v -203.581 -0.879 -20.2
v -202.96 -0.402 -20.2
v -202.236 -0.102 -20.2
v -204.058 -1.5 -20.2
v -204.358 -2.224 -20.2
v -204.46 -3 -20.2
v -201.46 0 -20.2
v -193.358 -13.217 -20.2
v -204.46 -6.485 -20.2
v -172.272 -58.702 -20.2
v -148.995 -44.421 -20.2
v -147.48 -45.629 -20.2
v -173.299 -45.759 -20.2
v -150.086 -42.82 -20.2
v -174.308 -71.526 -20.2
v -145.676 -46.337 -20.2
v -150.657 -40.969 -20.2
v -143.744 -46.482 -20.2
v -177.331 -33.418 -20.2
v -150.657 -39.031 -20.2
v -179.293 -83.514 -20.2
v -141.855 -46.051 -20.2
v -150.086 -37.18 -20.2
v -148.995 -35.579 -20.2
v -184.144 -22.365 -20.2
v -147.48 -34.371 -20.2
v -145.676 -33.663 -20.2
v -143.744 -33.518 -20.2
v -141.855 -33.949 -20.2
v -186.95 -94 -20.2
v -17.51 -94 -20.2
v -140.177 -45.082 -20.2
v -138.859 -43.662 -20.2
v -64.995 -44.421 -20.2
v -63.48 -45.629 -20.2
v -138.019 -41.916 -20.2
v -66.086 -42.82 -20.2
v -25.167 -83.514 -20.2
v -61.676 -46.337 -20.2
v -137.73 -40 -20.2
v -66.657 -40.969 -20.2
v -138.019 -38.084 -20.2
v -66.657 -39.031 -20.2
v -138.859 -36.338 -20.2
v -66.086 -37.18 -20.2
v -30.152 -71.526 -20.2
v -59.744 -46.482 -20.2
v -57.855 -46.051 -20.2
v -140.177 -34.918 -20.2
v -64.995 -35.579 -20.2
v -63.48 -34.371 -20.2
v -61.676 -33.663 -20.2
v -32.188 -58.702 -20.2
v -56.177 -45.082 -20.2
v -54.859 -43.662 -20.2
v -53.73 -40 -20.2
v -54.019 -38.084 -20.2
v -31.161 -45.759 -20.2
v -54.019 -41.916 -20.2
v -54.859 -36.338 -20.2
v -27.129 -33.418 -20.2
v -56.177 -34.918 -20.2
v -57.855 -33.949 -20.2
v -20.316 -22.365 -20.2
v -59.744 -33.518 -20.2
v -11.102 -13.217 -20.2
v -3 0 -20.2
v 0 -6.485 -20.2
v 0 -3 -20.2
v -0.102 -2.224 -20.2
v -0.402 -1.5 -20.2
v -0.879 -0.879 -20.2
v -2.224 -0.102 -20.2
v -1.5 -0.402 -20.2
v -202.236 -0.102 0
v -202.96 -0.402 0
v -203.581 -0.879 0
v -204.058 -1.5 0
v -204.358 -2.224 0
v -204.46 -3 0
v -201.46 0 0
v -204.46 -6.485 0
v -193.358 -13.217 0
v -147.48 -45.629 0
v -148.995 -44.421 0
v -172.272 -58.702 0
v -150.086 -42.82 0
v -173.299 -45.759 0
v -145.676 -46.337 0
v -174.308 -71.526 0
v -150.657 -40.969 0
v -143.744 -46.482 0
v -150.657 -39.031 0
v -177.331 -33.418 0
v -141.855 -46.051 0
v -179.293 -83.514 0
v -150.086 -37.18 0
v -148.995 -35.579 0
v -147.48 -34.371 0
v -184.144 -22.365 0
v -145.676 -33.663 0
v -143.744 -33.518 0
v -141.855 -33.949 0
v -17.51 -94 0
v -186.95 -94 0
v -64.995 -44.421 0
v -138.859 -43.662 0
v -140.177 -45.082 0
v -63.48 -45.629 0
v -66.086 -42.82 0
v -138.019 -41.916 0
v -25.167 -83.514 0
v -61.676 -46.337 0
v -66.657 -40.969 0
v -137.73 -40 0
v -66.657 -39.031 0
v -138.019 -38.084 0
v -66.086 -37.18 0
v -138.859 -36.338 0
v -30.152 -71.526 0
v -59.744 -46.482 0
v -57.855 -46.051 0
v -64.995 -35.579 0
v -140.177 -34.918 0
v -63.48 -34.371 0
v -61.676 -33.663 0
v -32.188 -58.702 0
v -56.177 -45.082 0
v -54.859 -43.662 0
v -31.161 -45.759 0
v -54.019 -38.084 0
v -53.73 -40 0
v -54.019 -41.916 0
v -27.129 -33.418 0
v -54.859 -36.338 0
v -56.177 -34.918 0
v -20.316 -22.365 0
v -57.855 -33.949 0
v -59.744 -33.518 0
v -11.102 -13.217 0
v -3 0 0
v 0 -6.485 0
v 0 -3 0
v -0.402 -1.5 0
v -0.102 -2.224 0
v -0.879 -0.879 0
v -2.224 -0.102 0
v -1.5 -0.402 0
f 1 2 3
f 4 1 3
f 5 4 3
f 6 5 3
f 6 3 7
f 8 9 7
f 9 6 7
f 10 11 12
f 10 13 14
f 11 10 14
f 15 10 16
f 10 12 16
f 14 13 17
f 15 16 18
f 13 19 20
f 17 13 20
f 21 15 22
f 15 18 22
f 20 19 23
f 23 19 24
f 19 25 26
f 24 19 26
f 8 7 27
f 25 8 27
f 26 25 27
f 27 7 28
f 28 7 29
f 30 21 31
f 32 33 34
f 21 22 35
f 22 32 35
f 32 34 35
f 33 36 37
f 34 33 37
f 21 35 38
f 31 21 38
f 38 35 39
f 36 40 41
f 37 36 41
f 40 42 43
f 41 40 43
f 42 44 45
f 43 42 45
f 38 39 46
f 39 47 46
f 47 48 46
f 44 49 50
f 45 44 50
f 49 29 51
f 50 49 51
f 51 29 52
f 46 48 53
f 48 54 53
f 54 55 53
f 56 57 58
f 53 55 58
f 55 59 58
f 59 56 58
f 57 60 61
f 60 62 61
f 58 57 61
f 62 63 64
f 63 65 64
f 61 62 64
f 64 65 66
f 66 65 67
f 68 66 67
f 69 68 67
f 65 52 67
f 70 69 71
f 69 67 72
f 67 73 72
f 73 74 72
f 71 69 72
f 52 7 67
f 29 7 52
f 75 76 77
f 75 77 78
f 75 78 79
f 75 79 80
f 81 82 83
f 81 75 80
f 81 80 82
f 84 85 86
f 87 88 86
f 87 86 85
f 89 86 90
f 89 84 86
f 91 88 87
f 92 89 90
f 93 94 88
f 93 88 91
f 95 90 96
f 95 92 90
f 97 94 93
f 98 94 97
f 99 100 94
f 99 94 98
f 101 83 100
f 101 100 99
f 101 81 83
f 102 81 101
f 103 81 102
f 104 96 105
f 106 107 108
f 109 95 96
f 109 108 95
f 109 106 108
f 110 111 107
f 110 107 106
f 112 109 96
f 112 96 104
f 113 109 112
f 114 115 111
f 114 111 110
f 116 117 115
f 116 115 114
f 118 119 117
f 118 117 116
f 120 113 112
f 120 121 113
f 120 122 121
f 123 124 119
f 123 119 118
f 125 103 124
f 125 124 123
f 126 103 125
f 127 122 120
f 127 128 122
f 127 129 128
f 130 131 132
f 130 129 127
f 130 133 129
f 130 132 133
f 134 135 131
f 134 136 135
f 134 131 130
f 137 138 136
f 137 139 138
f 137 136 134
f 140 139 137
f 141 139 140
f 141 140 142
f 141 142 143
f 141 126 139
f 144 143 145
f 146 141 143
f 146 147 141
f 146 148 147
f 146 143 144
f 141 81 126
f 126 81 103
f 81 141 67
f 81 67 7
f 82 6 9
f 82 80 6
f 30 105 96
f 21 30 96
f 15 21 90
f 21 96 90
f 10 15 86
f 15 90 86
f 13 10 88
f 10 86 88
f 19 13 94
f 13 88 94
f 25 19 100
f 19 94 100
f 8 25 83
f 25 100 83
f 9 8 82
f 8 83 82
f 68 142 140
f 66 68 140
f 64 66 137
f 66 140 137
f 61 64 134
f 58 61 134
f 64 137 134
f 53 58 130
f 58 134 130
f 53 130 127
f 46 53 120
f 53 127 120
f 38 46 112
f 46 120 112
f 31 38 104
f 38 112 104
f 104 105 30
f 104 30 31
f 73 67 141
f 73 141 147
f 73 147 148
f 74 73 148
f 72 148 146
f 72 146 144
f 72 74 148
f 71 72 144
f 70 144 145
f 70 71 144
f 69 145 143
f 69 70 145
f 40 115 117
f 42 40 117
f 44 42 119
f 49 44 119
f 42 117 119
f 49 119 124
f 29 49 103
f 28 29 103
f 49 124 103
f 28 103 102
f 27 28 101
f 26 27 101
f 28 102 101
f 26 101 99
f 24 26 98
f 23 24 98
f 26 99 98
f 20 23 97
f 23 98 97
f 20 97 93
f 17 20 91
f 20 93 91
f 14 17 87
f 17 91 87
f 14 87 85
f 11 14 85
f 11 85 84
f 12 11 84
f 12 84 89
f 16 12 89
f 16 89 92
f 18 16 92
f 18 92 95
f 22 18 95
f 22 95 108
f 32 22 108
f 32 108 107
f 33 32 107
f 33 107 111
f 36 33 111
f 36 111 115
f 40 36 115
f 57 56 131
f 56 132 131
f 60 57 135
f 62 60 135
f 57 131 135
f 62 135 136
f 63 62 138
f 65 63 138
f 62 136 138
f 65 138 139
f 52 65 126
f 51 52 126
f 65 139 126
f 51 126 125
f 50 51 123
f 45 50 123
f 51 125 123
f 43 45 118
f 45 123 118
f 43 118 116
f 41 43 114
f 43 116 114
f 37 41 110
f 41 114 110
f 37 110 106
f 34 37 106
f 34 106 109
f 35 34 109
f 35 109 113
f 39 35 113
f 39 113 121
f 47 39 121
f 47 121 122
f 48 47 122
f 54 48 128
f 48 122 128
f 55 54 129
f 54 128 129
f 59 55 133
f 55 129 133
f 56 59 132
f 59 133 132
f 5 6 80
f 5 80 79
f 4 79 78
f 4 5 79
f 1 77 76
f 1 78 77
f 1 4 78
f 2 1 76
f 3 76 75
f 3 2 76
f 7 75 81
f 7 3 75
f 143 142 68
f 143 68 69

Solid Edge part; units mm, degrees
sketch "Sketch1" plane through (0, 0, 0) normal (0, 0, 1) x (1, 0, 0)
  line L0 (0, 0) -> (-204.46, 0)
  line L1 (-204.46, 0) -> (-204.46, -94)
  line L2 (-204.46, -94) -> (0, -94)
  line L3 (0, -94) -> (0, 0)
extrude "Protrusion1" add sketch "Sketch1" against normal blind 20.2
sketch "Sketch2" plane through (-102.23, -47, 0) normal (0, 0, 1) x (1, 0, 0)
  circle A0 centre (42, 7) radius 6.5
  circle A1 centre (-42, 7) radius 6.5
extrude "ExtrudedCutout_1" cut sketch "Sketch2" against normal blind 21
sketch "Sketch3" plane through (-102.23, -47, 0) normal (0, 0, 1) x (1, 0, 0)
  circle A0 centre (-125, -9.55) radius 55
extrude "ExtrudedCutout_2" cut sketch "Sketch3" against normal blind 22
sketch "Sketch4" plane through (-102.23, -47, 0) normal (0, 0, 1) x (1, 0, 0)
  circle A0 centre (125, -9.55) radius 55
extrude "ExtrudedCutout_3" cut sketch "Sketch4" against normal blind 22
fillet "Round_1" radius 3 2 edges at (0, 0, -10.1) (-204.46, 0, -10.1)
